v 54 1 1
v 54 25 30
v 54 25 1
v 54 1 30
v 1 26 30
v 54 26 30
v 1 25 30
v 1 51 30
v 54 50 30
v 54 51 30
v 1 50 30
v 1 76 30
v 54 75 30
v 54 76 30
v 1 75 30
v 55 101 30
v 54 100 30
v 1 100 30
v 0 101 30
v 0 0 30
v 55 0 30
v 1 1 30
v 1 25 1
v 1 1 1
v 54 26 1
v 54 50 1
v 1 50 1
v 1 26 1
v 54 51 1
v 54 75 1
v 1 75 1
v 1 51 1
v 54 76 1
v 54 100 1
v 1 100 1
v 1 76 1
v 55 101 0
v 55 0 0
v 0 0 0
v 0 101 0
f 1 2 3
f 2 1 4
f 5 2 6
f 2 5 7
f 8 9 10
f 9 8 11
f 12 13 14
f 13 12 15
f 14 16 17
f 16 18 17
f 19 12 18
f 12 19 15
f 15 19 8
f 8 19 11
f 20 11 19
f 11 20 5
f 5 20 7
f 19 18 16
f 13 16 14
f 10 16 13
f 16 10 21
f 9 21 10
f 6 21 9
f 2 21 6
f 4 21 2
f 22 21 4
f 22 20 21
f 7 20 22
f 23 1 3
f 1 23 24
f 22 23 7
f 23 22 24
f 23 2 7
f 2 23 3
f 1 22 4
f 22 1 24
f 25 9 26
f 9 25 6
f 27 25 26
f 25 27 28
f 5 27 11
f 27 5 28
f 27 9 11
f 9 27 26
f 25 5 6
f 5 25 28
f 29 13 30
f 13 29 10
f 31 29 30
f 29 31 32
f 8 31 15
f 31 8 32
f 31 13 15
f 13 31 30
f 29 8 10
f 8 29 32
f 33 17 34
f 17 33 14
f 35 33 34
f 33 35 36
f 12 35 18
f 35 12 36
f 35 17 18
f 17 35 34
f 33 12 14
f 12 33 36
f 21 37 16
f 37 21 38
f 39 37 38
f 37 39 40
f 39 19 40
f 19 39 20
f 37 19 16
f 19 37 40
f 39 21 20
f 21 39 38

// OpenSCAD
N=4;
SZ=25;
WW=55;
HH=30;
THICKNESS=1;
difference() {
    cube([WW, SZ*N+1, HH]);
    for (i = [0:N-1]) {
        translate([THICKNESS, SZ*i+THICKNESS, THICKNESS])
            cube([WW-(THICKNESS*2), SZ-(THICKNESS*2-1), HH-THICKNESS]);
    }
}
